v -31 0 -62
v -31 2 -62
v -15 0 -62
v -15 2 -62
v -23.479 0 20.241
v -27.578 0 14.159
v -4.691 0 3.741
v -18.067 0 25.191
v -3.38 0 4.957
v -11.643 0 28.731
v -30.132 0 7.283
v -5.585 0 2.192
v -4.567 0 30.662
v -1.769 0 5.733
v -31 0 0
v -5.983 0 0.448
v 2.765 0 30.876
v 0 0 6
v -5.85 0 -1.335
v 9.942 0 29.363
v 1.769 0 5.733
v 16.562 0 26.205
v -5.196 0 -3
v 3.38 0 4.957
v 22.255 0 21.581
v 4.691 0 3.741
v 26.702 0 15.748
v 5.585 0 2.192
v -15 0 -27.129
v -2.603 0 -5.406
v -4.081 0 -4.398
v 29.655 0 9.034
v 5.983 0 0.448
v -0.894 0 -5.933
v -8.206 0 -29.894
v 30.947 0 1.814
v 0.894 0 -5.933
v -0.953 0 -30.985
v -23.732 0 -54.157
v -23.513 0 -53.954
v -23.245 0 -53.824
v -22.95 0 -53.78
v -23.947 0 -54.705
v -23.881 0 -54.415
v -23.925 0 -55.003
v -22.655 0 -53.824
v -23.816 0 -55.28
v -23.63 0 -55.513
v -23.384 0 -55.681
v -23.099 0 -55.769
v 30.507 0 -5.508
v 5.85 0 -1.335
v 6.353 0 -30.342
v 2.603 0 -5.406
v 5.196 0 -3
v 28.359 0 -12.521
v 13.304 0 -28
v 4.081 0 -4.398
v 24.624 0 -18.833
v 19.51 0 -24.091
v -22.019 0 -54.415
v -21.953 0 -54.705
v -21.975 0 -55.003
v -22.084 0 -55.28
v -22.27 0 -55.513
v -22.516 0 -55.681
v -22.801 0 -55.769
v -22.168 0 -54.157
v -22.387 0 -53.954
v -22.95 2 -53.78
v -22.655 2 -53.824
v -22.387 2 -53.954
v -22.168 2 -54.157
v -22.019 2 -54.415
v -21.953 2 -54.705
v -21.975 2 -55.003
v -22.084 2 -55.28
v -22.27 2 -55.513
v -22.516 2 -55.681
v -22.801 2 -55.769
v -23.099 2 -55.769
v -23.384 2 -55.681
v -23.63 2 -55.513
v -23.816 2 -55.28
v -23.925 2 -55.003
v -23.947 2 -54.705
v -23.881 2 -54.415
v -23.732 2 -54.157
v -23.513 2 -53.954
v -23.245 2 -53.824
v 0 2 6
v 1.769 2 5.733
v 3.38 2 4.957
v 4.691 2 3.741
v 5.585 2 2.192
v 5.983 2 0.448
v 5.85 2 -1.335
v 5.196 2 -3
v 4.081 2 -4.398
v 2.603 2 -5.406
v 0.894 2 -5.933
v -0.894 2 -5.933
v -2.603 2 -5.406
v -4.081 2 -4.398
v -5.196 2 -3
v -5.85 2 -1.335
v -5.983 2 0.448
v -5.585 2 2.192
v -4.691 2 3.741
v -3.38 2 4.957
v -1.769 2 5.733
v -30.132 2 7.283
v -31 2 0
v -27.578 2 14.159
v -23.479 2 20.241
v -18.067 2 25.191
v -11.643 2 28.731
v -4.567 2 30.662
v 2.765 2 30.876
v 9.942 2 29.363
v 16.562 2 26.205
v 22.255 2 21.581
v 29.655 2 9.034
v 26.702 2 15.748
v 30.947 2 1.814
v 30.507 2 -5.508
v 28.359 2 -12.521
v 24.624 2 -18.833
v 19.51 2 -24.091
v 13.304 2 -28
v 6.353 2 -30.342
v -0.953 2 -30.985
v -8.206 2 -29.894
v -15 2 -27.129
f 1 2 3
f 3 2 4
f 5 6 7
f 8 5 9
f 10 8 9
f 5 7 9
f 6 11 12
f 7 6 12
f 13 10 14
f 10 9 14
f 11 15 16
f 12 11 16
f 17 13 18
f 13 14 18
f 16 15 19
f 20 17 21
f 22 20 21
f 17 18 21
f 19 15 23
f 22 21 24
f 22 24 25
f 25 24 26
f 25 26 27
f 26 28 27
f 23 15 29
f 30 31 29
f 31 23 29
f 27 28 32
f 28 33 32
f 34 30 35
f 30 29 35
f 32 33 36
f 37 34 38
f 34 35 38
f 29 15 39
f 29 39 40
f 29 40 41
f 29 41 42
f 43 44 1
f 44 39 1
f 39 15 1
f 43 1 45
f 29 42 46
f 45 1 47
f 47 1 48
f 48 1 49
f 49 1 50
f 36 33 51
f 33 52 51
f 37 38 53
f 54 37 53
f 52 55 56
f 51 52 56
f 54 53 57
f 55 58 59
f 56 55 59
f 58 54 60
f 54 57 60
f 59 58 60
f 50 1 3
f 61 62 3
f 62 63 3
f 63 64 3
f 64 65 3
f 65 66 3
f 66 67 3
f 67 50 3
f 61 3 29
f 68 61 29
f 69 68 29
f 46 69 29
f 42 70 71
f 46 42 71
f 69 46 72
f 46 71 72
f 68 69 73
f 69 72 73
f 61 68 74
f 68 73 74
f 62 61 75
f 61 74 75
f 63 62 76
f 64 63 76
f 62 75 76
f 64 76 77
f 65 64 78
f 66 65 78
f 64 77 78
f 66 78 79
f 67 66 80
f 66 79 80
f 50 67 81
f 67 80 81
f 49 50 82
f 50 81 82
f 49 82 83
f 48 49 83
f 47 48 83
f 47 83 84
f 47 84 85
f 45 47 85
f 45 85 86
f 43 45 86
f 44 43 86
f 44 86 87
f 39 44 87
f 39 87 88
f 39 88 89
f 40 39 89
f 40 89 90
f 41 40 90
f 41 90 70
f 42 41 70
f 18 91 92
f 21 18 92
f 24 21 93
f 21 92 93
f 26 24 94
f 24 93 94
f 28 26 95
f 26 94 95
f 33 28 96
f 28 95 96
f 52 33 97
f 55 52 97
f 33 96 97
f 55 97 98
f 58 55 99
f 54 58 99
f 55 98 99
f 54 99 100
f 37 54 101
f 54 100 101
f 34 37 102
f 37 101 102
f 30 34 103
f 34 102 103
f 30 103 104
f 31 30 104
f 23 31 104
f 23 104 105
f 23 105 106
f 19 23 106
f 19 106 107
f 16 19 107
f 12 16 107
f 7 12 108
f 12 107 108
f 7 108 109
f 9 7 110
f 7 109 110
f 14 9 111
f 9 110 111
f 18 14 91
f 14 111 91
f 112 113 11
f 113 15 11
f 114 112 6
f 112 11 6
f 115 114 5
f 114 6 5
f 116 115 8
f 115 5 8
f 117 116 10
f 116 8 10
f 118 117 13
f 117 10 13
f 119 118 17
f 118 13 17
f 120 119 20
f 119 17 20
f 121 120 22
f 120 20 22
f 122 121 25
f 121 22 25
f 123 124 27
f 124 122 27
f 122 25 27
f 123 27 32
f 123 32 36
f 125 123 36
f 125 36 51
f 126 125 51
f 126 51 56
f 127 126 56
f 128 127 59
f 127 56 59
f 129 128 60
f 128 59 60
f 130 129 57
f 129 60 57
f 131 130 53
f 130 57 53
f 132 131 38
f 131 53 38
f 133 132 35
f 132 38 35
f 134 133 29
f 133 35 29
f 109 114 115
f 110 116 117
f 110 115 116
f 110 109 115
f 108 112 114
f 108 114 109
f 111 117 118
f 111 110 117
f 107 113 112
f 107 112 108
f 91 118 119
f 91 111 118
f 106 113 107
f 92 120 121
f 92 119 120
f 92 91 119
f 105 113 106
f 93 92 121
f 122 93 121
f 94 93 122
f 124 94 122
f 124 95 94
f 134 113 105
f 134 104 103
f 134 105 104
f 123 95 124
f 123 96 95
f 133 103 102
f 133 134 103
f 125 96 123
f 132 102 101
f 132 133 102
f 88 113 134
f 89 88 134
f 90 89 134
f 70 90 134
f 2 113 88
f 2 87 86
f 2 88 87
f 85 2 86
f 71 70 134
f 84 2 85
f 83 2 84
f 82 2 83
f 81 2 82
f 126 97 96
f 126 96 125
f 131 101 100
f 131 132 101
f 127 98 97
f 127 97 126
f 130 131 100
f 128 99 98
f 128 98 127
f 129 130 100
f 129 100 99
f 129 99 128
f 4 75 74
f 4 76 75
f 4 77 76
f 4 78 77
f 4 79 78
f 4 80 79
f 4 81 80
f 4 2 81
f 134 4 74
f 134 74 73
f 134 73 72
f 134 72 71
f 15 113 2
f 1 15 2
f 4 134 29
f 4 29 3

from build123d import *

# Parameters (mm, degrees)
SKETCH1_R           = 31
BOSS_EXTRUDE1_DEPTH = 2
SKETCH2_R           = 6
CUT_EXTRUDE1_DEPTH  = 2
SKETCH3_W           = 16
SKETCH3_H           = 62
BOSS_EXTRUDE2_DEPTH = 2
CUT_EXTRUDE2_REACH  = 71.347
SKETCH11_R          = 1


with BuildPart() as part:
    # Sketch1 → Boss-Extrude1 (new body)
    with BuildSketch(Plane(origin=(0, 0, 0), x_dir=(1, 0, 0), z_dir=(0, 1, 0))):
        with Locations(Location((0, 0, 0), (0, 0, 270))):
            Circle(SKETCH1_R)
    extrude(amount=BOSS_EXTRUDE1_DEPTH)

    # Sketch2 → Cut-Extrude1 (cut)
    with BuildSketch(Plane(origin=(0, 2, 0), x_dir=(1, 0, 0), z_dir=(0, 1, 0))):
        with Locations(Location((0, 0, 0), (0, 0, 270))):
            Circle(SKETCH2_R)
    extrude(amount=-CUT_EXTRUDE1_DEPTH, mode=Mode.SUBTRACT)

    # Sketch3 → Boss-Extrude2 (add)
    with BuildSketch(Plane(origin=(0, 2, 0), x_dir=(1, 0, 0), z_dir=(0, 1, 0))):
        with Locations((-23, 31)):
            Rectangle(SKETCH3_W, SKETCH3_H)
    extrude(amount=-BOSS_EXTRUDE2_DEPTH)

    # Sketch11 → Cut-Extrude2 (cut, up to next)
    with BuildSketch(Plane(origin=(0, 2, 0), x_dir=(1, 0, 0), z_dir=(0, 1, 0)), mode=Mode.PRIVATE) as cut_extrude2_sk1:
        with Locations(Location((-22.95, 54.78, 0), (0, 0, 270))):
            Circle(SKETCH11_R)
    cut_extrude2_tool1 = extrude(cut_extrude2_sk1.sketch, amount=-CUT_EXTRUDE2_REACH, mode=Mode.PRIVATE) & part.part
    add(cut_extrude2_tool1.solids().sort_by_distance((-22.95, 2, -54.78))[0], mode=Mode.SUBTRACT)


solid = part.part
